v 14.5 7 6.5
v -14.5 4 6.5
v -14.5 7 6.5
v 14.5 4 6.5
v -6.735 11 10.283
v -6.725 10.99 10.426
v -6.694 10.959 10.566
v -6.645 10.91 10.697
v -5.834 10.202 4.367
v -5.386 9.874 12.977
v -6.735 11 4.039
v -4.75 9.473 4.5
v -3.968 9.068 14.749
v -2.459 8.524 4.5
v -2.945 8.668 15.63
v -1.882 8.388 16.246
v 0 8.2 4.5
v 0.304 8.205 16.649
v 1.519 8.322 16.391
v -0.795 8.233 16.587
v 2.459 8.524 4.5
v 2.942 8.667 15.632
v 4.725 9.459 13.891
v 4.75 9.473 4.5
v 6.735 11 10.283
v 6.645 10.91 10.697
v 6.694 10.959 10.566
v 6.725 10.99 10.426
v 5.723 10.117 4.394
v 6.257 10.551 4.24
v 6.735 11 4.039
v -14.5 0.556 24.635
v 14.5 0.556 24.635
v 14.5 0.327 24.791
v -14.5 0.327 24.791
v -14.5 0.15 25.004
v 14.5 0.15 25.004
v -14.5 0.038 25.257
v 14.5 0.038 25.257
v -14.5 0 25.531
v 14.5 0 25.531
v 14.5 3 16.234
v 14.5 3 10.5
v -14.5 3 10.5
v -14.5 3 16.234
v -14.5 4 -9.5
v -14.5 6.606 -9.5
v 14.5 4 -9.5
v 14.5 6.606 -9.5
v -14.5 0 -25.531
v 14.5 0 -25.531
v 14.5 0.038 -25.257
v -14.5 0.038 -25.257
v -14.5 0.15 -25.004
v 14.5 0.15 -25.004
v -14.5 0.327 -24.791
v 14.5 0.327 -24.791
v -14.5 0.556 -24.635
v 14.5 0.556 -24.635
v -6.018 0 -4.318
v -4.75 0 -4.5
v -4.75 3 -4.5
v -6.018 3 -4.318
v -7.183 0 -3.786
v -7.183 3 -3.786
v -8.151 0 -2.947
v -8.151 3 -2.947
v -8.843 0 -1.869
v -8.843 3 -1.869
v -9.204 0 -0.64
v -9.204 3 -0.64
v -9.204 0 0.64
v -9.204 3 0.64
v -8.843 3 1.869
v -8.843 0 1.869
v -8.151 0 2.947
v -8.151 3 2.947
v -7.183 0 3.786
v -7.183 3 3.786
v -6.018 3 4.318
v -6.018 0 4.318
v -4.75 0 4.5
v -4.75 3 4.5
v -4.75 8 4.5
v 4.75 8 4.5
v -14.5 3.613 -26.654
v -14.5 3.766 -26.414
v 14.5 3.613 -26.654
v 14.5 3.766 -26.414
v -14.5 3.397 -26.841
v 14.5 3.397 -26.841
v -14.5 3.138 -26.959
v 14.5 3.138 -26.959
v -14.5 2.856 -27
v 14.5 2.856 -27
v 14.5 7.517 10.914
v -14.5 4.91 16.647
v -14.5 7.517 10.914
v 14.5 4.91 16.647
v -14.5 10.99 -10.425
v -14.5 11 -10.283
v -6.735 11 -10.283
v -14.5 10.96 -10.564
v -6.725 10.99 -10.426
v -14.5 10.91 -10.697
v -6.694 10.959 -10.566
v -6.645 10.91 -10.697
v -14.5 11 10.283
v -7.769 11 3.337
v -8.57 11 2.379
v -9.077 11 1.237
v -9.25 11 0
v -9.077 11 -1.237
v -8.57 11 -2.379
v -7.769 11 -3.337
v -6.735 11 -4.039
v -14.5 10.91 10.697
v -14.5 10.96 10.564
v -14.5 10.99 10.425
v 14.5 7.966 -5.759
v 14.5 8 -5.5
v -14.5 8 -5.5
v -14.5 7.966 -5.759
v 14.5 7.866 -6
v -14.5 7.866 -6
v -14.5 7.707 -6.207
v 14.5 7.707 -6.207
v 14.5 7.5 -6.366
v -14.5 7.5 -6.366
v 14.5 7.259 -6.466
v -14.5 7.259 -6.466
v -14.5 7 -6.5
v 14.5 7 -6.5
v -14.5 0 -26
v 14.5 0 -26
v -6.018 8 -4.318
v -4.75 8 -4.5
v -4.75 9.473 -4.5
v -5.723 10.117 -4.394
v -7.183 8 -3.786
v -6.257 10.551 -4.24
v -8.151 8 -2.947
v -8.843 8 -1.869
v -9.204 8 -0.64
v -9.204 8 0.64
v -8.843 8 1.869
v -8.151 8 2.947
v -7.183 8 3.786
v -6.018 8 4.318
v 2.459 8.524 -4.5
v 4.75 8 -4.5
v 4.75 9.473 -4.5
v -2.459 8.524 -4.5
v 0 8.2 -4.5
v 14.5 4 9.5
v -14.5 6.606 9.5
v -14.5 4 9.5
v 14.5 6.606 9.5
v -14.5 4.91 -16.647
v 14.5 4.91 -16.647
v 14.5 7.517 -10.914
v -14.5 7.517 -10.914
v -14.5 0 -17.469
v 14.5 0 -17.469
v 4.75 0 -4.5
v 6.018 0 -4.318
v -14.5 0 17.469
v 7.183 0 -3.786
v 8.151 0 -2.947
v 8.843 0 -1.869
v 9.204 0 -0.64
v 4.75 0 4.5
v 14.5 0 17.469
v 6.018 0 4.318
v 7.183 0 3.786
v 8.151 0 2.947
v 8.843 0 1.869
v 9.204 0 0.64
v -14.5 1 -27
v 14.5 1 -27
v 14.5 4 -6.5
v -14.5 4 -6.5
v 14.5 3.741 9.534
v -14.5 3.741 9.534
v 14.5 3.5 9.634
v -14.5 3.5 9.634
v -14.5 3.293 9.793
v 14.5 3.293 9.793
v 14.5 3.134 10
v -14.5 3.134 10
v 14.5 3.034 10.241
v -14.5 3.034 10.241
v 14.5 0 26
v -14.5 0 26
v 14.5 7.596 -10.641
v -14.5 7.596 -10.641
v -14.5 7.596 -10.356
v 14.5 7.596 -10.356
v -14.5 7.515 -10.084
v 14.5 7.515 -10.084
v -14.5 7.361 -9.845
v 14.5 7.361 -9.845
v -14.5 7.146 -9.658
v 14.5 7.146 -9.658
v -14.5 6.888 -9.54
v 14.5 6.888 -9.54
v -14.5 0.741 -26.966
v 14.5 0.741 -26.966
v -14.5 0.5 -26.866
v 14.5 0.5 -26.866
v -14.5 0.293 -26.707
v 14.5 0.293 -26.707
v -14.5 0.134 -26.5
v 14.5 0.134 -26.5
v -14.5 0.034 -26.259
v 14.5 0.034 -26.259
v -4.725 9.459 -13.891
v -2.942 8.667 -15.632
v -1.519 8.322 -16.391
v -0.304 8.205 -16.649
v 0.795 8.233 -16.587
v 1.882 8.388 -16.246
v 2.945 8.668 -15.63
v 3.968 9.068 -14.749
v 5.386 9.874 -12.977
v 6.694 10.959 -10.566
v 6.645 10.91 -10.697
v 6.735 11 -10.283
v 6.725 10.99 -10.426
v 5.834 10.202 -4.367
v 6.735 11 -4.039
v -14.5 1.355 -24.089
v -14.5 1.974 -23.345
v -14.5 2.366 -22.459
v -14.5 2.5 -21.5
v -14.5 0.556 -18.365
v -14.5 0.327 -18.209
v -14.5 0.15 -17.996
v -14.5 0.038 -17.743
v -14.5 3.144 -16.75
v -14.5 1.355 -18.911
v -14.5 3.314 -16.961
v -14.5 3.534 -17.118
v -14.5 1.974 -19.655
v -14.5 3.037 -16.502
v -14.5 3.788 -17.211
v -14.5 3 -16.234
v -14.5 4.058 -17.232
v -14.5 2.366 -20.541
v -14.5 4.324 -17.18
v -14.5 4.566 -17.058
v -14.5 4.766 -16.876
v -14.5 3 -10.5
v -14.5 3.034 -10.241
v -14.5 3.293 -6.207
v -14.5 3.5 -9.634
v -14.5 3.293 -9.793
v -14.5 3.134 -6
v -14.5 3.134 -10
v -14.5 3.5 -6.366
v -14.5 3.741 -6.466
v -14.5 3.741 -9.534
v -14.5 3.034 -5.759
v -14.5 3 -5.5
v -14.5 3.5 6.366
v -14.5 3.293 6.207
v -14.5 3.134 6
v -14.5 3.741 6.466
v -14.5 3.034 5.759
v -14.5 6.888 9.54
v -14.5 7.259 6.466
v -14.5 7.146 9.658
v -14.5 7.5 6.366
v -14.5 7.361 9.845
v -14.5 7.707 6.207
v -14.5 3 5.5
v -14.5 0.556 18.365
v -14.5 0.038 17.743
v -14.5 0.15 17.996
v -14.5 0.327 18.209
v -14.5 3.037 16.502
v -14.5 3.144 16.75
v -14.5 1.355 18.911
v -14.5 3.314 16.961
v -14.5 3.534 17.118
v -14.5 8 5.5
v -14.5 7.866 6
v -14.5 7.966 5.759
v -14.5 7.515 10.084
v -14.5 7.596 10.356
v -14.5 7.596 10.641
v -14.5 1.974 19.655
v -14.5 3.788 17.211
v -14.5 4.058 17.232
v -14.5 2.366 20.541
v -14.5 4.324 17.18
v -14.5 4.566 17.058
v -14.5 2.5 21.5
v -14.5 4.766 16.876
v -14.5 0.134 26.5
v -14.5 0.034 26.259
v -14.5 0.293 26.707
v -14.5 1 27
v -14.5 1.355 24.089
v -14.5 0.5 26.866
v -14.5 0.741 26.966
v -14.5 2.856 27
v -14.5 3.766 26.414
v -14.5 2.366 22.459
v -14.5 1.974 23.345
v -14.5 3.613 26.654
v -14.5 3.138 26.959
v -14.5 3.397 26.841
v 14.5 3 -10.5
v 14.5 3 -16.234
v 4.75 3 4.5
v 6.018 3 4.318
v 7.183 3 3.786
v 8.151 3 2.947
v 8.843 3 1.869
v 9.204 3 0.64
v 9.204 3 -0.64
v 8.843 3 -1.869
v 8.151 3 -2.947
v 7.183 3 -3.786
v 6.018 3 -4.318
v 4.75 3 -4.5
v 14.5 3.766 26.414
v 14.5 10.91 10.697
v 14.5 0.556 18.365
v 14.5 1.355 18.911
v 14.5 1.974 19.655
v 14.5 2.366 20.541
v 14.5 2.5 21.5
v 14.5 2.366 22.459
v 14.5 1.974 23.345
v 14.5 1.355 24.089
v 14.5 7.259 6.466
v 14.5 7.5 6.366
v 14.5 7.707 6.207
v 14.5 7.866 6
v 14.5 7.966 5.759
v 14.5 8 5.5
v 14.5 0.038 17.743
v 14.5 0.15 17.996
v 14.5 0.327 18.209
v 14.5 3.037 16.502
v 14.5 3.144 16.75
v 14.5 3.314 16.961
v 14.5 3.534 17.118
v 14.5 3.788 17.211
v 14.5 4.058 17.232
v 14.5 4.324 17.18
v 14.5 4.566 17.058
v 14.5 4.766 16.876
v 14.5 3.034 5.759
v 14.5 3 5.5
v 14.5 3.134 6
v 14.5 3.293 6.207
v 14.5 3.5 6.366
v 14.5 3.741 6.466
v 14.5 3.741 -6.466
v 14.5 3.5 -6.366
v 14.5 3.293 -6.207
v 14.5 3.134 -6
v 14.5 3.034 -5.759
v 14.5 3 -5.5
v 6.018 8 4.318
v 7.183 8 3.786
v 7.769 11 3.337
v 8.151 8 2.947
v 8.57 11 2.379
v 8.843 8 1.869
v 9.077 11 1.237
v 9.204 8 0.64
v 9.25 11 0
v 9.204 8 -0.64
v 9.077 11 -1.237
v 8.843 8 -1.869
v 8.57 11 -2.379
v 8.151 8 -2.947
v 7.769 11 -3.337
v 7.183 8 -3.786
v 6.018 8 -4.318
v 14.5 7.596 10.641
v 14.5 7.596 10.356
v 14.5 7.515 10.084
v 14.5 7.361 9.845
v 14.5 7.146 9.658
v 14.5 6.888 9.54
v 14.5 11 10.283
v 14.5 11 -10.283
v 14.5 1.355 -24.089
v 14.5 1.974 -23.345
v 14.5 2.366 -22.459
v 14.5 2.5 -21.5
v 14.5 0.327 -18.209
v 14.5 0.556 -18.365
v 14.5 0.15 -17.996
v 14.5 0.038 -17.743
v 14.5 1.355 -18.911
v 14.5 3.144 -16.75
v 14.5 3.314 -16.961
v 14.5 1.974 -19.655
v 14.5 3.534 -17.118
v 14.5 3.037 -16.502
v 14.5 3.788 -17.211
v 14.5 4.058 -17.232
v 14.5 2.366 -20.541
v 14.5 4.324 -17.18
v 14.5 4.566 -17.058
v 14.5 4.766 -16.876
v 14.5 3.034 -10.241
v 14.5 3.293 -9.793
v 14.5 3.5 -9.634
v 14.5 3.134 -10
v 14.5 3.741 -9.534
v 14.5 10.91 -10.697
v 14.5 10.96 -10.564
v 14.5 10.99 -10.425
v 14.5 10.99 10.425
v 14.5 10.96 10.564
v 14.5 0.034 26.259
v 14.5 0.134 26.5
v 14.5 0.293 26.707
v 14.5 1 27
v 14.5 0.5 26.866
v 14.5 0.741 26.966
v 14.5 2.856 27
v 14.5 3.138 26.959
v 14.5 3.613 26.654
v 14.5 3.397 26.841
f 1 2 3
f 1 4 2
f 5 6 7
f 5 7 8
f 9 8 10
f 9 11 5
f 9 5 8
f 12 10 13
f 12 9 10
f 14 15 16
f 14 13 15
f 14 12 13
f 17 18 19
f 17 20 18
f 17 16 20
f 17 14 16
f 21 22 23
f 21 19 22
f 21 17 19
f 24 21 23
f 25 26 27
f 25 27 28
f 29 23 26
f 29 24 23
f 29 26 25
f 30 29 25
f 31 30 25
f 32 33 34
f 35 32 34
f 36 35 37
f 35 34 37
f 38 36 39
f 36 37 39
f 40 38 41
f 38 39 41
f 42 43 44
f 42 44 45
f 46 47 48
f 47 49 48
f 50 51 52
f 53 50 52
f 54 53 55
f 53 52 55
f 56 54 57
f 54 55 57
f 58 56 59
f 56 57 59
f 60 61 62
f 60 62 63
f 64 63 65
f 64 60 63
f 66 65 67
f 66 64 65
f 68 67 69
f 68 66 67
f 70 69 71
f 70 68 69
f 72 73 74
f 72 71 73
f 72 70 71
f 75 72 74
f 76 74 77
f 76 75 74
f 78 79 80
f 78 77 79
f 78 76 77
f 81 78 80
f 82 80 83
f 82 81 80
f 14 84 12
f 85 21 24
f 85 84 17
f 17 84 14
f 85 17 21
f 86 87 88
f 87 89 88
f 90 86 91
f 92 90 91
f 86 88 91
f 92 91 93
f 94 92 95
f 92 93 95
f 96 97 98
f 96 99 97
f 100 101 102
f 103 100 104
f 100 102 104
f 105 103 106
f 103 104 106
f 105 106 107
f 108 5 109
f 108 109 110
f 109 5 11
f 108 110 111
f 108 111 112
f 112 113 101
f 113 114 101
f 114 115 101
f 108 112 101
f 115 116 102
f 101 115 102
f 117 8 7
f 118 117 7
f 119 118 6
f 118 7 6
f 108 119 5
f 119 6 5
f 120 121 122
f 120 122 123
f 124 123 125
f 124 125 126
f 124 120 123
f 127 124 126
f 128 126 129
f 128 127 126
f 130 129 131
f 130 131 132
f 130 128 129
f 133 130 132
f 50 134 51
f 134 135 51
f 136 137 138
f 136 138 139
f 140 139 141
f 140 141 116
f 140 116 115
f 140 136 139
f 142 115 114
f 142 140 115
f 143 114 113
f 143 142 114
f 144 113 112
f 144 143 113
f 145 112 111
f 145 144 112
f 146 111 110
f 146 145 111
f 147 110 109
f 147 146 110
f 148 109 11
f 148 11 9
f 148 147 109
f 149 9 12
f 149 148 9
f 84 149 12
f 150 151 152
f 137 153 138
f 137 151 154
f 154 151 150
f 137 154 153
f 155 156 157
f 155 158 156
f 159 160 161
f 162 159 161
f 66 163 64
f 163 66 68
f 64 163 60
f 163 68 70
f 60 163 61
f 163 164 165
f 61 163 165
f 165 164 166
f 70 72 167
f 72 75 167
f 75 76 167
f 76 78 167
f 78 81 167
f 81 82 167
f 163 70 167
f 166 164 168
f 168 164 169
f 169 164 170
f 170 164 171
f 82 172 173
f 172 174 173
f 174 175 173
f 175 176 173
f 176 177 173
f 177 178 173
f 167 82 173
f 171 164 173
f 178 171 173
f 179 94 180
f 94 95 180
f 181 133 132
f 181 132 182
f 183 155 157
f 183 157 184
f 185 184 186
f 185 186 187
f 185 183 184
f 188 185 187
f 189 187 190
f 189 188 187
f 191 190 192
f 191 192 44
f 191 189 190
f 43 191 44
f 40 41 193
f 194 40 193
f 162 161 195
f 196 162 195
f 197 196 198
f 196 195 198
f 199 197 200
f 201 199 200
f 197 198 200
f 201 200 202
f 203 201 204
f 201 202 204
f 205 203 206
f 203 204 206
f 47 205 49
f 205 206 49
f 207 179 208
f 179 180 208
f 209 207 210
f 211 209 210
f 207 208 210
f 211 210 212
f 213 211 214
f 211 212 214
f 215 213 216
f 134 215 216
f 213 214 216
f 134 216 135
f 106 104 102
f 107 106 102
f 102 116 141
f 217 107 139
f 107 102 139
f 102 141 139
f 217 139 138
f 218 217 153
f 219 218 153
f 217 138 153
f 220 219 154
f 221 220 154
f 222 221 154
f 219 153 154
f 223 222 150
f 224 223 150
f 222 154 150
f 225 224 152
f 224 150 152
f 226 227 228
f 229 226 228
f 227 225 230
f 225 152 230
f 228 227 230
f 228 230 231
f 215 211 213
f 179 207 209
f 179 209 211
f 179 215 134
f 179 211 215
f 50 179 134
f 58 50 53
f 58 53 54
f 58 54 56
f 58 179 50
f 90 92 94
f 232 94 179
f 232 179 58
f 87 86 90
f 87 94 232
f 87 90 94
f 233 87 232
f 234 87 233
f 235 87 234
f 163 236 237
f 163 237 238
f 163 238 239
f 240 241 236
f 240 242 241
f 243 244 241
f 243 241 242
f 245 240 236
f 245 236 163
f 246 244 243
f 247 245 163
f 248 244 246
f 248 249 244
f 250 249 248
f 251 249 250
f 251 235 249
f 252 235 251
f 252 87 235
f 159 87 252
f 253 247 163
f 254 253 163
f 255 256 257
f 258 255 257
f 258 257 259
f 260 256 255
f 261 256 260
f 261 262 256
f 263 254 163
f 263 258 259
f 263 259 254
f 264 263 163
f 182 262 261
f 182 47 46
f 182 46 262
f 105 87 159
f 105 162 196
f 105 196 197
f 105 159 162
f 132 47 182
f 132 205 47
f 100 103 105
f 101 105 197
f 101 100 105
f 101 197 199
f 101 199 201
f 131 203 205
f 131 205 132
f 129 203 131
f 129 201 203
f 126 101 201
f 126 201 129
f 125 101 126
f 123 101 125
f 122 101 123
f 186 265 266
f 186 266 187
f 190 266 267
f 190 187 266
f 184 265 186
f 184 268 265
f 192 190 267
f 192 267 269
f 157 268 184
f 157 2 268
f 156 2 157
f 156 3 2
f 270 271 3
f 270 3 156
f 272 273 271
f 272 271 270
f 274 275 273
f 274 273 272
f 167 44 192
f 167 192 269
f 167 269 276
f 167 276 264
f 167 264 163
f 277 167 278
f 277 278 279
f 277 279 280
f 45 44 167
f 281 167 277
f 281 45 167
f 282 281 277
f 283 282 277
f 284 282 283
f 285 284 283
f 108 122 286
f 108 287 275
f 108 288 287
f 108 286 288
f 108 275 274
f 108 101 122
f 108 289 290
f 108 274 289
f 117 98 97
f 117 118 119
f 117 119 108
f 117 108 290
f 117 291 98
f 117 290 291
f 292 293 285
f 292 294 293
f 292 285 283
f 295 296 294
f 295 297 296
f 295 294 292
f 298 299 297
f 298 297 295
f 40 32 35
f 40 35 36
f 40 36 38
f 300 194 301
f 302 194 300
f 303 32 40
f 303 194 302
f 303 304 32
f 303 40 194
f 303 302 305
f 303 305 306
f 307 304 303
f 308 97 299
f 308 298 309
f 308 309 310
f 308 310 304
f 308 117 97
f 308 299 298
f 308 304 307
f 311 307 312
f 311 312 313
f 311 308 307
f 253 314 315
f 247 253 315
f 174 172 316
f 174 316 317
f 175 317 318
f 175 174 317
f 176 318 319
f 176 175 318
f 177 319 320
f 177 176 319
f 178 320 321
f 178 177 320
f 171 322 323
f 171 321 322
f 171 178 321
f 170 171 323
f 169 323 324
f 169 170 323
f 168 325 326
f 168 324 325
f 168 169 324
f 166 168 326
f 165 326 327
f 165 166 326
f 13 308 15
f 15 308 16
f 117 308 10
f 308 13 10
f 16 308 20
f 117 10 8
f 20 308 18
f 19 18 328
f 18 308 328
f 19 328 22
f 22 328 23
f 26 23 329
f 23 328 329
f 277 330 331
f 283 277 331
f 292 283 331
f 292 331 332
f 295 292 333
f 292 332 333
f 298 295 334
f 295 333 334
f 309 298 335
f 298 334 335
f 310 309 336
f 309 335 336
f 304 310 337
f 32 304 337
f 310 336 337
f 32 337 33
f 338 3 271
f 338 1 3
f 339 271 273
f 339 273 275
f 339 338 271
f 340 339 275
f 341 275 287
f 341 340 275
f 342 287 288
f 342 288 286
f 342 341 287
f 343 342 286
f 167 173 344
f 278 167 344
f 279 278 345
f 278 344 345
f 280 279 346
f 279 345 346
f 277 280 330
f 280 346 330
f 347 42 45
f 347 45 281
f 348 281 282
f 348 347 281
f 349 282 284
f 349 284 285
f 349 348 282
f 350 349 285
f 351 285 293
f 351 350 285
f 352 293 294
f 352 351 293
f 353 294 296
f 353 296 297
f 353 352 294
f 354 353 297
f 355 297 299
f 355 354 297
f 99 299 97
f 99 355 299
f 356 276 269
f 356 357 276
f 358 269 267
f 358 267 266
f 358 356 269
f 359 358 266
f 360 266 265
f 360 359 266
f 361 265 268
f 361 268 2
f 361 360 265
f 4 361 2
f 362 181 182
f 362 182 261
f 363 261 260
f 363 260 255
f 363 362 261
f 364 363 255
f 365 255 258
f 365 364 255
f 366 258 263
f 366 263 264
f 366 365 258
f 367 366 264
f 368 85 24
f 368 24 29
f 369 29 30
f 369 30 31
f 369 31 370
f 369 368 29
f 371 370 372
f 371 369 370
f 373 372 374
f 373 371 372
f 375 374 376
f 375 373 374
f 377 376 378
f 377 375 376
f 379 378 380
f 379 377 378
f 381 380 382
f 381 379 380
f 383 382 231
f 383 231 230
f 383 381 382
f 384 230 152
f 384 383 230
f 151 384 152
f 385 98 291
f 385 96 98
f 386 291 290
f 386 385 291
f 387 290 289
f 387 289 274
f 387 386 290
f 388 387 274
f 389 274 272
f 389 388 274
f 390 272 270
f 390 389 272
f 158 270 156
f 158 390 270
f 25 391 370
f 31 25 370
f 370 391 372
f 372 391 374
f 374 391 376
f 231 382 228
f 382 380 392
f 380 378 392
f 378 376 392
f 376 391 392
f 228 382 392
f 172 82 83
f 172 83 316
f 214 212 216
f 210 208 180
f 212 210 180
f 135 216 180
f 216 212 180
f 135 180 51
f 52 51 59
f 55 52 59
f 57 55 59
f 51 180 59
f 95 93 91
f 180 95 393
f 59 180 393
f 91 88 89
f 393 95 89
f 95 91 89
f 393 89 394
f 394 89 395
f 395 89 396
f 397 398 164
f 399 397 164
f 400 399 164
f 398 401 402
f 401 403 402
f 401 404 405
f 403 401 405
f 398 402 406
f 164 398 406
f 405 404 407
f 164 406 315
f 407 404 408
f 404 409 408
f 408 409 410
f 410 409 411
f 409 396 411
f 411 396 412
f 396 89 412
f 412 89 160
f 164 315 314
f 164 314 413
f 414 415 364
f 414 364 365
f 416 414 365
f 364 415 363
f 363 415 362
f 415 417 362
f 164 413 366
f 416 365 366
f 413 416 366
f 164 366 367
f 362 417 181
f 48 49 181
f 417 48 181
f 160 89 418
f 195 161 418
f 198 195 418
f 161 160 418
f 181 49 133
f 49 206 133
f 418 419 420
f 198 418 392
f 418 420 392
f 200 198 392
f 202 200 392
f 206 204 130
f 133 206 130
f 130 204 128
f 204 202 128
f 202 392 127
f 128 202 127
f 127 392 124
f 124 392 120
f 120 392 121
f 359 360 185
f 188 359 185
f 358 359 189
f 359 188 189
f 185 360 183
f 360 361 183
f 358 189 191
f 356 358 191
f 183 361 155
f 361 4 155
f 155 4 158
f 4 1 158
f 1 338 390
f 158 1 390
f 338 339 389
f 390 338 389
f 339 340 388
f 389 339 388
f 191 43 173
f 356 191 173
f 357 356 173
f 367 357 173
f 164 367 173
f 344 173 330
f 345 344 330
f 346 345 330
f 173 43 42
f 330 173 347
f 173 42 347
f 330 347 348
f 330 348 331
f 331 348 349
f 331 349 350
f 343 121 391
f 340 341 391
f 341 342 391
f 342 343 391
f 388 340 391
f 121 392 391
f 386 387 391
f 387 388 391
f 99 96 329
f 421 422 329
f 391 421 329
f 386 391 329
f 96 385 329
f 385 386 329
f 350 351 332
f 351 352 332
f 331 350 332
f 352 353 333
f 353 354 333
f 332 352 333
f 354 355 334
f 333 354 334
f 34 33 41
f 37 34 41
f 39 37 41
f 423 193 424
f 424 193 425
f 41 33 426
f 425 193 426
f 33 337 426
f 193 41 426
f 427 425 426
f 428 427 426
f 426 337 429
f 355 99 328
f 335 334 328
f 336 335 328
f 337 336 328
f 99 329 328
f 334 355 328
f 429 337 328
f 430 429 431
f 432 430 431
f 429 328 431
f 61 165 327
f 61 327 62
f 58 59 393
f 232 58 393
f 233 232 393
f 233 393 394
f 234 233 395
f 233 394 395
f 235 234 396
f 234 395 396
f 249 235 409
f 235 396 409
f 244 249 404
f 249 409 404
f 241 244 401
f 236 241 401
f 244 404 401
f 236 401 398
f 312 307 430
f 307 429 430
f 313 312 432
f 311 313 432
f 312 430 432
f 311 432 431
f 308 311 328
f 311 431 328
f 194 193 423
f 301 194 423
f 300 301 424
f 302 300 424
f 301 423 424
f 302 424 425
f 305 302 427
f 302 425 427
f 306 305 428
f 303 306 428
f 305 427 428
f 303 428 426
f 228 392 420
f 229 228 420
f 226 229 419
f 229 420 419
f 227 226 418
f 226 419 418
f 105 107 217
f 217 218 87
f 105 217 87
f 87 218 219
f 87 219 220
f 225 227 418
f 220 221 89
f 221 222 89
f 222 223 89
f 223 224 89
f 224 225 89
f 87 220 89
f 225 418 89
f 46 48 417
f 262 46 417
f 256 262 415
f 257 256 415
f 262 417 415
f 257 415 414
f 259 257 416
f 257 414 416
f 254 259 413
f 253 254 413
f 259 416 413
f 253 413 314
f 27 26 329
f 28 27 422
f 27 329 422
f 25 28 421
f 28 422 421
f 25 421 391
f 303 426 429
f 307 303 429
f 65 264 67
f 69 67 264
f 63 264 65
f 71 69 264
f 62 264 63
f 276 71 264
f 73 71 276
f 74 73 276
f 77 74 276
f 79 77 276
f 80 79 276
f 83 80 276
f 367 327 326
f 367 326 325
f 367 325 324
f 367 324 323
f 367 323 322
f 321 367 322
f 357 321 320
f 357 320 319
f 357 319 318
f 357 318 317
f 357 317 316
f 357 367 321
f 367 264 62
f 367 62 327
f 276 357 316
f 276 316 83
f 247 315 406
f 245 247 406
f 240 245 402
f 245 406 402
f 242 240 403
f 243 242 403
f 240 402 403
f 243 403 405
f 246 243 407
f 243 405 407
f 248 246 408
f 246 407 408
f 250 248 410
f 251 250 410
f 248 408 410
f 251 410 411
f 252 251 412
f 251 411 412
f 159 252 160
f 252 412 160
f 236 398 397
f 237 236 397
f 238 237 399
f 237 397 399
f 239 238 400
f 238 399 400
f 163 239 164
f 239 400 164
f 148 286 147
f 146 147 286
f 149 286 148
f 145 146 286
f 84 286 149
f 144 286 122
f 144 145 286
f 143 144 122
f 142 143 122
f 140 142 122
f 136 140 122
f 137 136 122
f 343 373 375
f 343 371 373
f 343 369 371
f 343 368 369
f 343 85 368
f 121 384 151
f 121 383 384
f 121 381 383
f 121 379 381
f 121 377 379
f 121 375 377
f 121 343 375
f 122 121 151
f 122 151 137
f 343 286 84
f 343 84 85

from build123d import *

# Parameters (mm, degrees)
EXTRUSION1_DEPTH             = 14.5
ENL_V_MAT_EXTRU_1_DEPTH      = 12
ESQUISSE3_R                  = 9.5
ENL_V_MAT_EXTRU_4_DEPTH      = 28
ENL_V_MAT_EXTRU_4_DEPTH_BACK = 28


with BuildPart() as part:
    # Esquisse1 → Extrusion1 (new body, symmetric)
    with BuildSketch(Plane(origin=(0, 0, 0), x_dir=(0, 0, -1), z_dir=(1, 0, 0))):
        with BuildLine():
            Line((-27, 1), (-27, 2.85608673))
            ThreePointArc((-27, 2.85608673), (-26.840774329, 3.397472477), (-26.413802944, 3.766453207))
            Line((-26.413802944, 3.766453207), (-10.69719375, 10.910366477))
            ThreePointArc((-10.69719375, 10.910366477), (-10.495090501, 10.977334763), (-10.283390805, 11))
            Line((-10.283390805, 11), (10.283390805, 11))
            ThreePointArc((10.283390805, 11), (10.495090501, 10.977334763), (10.69719375, 10.910366477))
            Line((10.69719375, 10.910366477), (26.413802944, 3.766453207))
            ThreePointArc((26.413802944, 3.766453207), (26.840774329, 3.397472477), (27, 2.85608673))
            Line((27, 2.85608673), (27, 1))
            ThreePointArc((27, 1), (26.707106781, 0.292893219), (26, 0))
            Line((26, 0), (25.531128874, 0))
            ThreePointArc((25.531128874, 0), (25.004082597, 0.150163414), (24.635322458, 0.555555556))
            ThreePointArc((24.635322458, 0.555555556), (21.5, 2.5), (18.364677542, 0.555555556))
            ThreePointArc((18.364677542, 0.555555556), (17.995917403, 0.150163414), (17.468871126, 0))
            Line((17.468871126, 0), (-17.468871126, 0))
            ThreePointArc((-17.468871126, 0), (-17.995917403, 0.150163414), (-18.364677542, 0.555555556))
            ThreePointArc((-18.364677542, 0.555555556), (-21.5, 2.5), (-24.635322458, 0.555555556))
            ThreePointArc((-24.635322458, 0.555555556), (-25.004082597, 0.150163414), (-25.531128874, 0))
            Line((-25.531128874, 0), (-26, 0))
            ThreePointArc((-26, 0), (-26.707106781, 0.292893219), (-27, 1))
        make_face()
        with BuildLine():
            Line((-5.5, 8), (5.5, 8))
            ThreePointArc((5.5, 8), (6.207106781, 7.707106781), (6.5, 7))
            Line((6.5, 7), (6.5, 4))
            ThreePointArc((6.5, 4), (6.207106781, 3.292893219), (5.5, 3))
            Line((5.5, 3), (-5.5, 3))
            ThreePointArc((-5.5, 3), (-6.207106781, 3.292893219), (-6.5, 4))
            Line((-6.5, 4), (-6.5, 7))
            ThreePointArc((-6.5, 7), (-6.207106781, 7.707106781), (-5.5, 8))
        make_face(mode=Mode.SUBTRACT)
        with BuildLine():
            Line((-9.5, 6.606165101), (-9.5, 4))
            ThreePointArc((-9.5, 4), (-9.792893219, 3.292893219), (-10.5, 3))
            Line((-10.5, 3), (-16.233563221, 3))
            ThreePointArc((-16.233563221, 3), (-17.210897984, 3.788300304), (-16.647366165, 4.910366477))
            Line((-16.647366165, 4.910366477), (-10.913802944, 7.516531578))
            ThreePointArc((-10.913802944, 7.516531578), (-9.958614252, 7.446939429), (-9.5, 6.606165101))
        make_face(mode=Mode.SUBTRACT)
        with BuildLine():
            Line((9.5, 6.606165101), (9.5, 4))
            ThreePointArc((9.5, 4), (9.792893219, 3.292893219), (10.5, 3))
            Line((10.5, 3), (16.233563221, 3))
            ThreePointArc((16.233563221, 3), (17.210897984, 3.788300304), (16.647366165, 4.910366477))
            Line((16.647366165, 4.910366477), (10.913802944, 7.516531578))
            ThreePointArc((10.913802944, 7.516531578), (9.958614252, 7.446939429), (9.5, 6.606165101))
        make_face(mode=Mode.SUBTRACT)
    extrude(amount=EXTRUSION1_DEPTH, both=True)

    # Esquisse2 → Enlèv. mat.-Extru.1 (cut, through all)
    with BuildSketch(Plane.XZ):
        with BuildLine():
            Line((-4.75, 4.5), (4.75, 4.5))
            ThreePointArc((4.75, 4.5), (9.25, 0), (4.75, -4.5))
            Line((4.75, -4.5), (-4.75, -4.5))
            ThreePointArc((-4.75, -4.5), (-9.25, 0), (-4.75, 4.5))
        make_face()
    extrude(amount=-ENL_V_MAT_EXTRU_1_DEPTH, mode=Mode.SUBTRACT)

    # Esquisse3 → Enlèv. mat.-Extru.4 (cut, two sides)
    with BuildSketch(Plane.XY) as enl_v_mat_extru_4_sk:
        with Locations((0, 17.7)):
            Circle(ESQUISSE3_R)
    extrude(amount=ENL_V_MAT_EXTRU_4_DEPTH, mode=Mode.SUBTRACT)
    extrude(enl_v_mat_extru_4_sk.sketch, amount=-ENL_V_MAT_EXTRU_4_DEPTH_BACK, mode=Mode.SUBTRACT)


solid = part.part
